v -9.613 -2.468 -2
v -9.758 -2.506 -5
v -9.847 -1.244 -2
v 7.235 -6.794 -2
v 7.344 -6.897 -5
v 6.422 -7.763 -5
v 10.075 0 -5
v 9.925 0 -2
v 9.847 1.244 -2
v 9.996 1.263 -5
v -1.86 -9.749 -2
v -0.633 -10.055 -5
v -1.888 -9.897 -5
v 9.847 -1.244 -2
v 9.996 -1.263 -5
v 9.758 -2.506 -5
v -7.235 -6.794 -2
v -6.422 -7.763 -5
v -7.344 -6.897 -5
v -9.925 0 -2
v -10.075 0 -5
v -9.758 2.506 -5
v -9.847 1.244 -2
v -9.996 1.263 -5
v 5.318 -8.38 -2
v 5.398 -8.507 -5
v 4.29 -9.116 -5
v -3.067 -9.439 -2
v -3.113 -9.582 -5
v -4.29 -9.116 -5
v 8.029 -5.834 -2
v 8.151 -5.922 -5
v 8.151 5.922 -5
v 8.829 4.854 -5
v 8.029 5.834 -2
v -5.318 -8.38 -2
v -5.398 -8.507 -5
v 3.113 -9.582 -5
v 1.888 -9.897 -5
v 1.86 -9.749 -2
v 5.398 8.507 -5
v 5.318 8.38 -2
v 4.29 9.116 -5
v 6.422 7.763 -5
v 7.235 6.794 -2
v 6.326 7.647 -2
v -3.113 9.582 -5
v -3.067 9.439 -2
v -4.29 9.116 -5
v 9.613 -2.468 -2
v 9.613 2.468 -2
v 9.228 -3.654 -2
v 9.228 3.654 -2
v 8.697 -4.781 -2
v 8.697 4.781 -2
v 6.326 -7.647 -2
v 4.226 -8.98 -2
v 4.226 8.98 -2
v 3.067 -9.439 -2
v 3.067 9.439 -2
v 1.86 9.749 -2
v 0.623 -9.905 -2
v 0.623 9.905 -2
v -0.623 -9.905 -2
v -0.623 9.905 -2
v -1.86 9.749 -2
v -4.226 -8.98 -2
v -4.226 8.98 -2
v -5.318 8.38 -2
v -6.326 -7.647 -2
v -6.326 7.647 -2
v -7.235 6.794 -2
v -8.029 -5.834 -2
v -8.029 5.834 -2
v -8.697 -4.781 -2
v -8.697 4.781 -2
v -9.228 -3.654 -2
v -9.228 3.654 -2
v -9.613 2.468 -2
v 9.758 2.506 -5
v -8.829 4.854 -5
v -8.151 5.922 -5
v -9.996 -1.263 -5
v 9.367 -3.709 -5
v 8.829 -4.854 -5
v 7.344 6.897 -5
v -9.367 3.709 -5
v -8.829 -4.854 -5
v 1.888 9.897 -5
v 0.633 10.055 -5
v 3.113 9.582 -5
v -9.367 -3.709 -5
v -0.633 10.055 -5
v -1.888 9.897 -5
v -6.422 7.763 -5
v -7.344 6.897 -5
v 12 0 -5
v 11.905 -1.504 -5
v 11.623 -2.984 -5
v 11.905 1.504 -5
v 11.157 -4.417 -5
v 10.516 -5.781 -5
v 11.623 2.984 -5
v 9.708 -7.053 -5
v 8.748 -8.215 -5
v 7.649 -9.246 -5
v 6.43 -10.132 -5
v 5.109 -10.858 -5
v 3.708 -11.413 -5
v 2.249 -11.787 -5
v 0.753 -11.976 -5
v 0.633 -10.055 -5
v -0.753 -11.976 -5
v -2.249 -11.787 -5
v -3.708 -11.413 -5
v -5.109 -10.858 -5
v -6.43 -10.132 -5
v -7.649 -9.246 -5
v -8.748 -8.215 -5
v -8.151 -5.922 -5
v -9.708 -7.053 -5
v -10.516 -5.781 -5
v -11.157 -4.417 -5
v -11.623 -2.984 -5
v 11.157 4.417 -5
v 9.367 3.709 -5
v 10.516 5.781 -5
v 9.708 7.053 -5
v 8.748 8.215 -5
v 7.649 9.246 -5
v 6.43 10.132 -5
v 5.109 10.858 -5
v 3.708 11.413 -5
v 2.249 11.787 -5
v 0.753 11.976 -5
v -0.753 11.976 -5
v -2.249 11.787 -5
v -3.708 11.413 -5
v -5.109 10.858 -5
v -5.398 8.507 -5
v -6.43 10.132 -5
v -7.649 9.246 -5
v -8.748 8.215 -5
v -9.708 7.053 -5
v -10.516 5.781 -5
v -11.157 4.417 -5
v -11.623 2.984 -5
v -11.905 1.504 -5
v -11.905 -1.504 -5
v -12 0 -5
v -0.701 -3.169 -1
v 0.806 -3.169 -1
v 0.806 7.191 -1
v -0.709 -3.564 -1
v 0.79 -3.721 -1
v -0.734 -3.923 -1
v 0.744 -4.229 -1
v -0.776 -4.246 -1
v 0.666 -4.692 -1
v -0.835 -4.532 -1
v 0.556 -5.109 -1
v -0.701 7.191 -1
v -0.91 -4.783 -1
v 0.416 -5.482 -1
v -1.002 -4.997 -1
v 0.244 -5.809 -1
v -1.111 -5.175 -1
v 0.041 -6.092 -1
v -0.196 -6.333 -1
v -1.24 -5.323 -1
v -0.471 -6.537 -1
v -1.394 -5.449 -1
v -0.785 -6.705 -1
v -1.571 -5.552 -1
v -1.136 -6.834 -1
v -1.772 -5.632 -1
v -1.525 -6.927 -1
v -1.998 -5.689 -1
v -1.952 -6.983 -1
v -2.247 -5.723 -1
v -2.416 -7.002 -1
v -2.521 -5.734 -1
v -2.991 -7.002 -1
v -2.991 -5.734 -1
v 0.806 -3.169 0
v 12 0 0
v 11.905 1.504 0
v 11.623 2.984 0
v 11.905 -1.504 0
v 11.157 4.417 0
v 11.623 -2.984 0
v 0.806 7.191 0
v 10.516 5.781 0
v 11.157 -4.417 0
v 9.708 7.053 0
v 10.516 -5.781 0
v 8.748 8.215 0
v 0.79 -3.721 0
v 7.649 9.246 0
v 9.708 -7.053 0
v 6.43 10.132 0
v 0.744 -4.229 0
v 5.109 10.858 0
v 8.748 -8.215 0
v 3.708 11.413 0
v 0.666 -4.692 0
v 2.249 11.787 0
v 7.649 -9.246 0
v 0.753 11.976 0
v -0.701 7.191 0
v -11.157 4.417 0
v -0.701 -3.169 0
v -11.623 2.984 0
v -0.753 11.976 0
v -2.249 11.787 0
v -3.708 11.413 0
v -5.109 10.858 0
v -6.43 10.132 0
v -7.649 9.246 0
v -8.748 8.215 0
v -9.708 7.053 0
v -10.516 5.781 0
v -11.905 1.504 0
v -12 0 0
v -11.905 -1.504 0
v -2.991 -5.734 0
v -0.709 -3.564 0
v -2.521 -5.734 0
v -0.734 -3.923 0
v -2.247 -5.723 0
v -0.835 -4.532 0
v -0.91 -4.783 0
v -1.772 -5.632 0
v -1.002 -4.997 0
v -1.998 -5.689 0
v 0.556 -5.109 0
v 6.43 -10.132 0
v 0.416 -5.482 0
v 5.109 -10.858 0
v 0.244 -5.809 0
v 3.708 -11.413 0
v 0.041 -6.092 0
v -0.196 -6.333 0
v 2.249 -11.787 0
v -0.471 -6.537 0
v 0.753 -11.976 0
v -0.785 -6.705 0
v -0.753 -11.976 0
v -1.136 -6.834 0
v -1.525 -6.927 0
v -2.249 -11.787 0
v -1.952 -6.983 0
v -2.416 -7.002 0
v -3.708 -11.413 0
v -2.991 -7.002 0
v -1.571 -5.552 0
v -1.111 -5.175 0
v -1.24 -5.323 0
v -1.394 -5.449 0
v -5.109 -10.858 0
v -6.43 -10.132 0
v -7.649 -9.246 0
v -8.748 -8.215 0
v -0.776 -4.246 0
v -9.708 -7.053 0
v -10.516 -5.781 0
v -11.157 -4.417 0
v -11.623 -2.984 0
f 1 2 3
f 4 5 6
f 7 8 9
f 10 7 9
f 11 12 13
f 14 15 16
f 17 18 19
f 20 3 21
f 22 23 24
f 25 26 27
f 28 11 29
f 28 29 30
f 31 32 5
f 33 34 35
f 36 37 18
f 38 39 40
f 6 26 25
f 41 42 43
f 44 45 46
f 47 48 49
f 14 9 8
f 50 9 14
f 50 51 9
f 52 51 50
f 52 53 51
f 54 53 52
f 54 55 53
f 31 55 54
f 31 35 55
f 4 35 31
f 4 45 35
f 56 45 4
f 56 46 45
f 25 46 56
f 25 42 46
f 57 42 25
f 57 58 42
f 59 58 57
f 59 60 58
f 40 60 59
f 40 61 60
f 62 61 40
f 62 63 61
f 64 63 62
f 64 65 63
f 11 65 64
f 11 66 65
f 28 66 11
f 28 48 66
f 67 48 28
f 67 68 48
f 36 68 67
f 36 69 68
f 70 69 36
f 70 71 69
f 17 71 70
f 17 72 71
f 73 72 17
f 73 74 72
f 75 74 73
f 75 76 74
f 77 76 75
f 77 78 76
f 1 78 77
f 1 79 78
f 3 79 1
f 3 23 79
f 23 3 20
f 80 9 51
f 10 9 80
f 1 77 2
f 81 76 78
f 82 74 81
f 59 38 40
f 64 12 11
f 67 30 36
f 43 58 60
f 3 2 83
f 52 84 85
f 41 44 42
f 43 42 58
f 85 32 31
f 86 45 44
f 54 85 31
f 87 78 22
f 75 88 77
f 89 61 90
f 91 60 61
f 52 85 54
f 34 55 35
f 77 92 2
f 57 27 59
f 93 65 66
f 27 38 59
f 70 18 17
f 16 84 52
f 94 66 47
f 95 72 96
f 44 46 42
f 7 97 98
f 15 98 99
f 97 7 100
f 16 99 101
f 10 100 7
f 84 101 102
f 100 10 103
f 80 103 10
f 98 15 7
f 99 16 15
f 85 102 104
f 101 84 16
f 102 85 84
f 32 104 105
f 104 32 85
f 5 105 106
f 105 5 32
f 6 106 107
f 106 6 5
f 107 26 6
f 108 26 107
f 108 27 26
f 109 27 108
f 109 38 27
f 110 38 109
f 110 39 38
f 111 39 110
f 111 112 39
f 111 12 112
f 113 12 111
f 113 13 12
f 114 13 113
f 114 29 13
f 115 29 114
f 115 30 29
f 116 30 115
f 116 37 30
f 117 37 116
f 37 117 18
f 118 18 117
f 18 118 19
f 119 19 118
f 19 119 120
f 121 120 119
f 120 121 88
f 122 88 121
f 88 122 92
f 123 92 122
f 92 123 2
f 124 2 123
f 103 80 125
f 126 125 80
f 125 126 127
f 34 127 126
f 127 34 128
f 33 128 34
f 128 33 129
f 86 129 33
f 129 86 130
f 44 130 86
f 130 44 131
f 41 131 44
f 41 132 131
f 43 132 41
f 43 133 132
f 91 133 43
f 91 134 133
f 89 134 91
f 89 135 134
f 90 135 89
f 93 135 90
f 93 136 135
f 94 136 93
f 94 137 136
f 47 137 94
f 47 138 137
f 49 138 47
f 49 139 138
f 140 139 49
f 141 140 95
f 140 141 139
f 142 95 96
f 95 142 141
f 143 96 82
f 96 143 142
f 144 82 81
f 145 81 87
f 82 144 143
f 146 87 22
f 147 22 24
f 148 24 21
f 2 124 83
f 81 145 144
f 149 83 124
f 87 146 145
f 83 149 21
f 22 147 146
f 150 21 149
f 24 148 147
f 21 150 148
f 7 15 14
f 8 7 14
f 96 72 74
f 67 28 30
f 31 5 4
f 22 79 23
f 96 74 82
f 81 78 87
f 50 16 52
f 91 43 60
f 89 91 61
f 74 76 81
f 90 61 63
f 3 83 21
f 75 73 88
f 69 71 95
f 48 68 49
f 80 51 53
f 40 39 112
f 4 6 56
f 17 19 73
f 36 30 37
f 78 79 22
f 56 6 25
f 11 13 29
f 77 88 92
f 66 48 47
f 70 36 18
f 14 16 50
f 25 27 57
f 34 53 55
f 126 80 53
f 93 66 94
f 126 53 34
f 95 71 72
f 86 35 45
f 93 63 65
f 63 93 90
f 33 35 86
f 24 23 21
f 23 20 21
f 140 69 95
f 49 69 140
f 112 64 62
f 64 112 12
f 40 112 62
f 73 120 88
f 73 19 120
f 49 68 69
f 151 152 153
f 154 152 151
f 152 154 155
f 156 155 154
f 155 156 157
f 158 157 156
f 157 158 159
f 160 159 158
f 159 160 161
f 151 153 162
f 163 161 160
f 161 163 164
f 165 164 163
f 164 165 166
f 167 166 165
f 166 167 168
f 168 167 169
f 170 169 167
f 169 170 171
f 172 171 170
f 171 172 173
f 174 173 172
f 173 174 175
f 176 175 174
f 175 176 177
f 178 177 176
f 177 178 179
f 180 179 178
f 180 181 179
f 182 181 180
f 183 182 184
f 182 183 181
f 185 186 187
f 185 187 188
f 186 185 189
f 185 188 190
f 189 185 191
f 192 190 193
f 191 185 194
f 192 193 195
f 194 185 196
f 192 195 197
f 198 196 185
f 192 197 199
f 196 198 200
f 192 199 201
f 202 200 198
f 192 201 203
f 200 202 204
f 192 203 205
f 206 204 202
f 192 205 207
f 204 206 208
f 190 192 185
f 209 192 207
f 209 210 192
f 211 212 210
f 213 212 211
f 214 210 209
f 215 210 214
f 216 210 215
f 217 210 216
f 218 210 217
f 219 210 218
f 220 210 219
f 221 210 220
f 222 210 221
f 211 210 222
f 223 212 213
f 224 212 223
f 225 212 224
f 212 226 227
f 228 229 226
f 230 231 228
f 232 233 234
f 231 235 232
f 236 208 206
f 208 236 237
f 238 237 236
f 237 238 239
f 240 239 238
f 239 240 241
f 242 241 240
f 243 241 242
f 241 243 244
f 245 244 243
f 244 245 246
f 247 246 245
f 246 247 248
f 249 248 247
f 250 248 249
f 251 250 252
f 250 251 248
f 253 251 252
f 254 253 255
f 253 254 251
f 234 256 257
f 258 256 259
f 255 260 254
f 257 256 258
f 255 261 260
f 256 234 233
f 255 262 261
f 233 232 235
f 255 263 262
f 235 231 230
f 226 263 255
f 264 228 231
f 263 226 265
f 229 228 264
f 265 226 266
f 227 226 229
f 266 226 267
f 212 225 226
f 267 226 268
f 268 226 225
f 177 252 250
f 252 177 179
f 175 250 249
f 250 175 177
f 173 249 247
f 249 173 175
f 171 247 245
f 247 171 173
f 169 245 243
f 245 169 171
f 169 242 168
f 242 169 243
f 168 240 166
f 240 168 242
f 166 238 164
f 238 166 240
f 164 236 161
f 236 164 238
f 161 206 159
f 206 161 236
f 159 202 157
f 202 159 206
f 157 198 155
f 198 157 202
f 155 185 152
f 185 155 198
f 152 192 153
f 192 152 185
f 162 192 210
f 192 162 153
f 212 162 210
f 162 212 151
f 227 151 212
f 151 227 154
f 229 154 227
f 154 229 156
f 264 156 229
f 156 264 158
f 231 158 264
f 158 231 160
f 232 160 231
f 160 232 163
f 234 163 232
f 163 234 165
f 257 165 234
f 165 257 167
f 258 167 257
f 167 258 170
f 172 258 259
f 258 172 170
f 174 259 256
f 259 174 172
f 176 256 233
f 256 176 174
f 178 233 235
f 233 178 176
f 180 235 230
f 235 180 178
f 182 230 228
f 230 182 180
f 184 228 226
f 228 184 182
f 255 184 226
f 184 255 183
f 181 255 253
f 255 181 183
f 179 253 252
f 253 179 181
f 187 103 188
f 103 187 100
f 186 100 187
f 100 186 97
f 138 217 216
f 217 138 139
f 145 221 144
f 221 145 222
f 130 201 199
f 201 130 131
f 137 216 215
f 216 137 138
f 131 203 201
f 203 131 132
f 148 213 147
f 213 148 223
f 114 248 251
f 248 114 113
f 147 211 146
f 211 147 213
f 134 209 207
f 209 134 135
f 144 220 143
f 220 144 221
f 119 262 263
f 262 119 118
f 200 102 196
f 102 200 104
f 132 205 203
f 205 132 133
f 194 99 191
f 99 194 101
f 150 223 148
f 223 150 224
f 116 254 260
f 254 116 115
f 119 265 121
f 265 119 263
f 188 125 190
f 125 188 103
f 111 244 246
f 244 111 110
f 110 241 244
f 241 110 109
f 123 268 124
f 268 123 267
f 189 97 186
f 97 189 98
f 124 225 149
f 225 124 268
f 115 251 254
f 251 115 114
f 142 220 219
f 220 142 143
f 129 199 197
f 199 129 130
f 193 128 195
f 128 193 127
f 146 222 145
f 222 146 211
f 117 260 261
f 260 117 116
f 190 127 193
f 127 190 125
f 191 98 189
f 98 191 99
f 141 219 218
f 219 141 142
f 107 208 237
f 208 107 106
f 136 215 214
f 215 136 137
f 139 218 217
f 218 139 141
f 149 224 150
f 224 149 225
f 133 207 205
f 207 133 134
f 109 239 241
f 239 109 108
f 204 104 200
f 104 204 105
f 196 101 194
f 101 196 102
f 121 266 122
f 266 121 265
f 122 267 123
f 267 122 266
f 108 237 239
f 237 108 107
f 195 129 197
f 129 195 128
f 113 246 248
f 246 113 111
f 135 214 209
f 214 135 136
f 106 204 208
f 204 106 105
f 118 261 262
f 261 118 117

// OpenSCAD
$fn = 50;

difference() {
	union() {
		translate(v = [0, 0, -5.0]) {
			cylinder(h = 5, r = 12.0);
		}
	}
	union() {
		#translate(v = [0, 0, -5.0]) {
			cylinder(h = 3, r1 = 10.075, r2 = 9.925);
		}
		translate(v = [0, 0, -1]) {
			linear_extrude(height = 1) {
				text(font = "Wingdings", halign = "center", size = 11, text = "J", valign = "center");
			}
		}
	}
}
